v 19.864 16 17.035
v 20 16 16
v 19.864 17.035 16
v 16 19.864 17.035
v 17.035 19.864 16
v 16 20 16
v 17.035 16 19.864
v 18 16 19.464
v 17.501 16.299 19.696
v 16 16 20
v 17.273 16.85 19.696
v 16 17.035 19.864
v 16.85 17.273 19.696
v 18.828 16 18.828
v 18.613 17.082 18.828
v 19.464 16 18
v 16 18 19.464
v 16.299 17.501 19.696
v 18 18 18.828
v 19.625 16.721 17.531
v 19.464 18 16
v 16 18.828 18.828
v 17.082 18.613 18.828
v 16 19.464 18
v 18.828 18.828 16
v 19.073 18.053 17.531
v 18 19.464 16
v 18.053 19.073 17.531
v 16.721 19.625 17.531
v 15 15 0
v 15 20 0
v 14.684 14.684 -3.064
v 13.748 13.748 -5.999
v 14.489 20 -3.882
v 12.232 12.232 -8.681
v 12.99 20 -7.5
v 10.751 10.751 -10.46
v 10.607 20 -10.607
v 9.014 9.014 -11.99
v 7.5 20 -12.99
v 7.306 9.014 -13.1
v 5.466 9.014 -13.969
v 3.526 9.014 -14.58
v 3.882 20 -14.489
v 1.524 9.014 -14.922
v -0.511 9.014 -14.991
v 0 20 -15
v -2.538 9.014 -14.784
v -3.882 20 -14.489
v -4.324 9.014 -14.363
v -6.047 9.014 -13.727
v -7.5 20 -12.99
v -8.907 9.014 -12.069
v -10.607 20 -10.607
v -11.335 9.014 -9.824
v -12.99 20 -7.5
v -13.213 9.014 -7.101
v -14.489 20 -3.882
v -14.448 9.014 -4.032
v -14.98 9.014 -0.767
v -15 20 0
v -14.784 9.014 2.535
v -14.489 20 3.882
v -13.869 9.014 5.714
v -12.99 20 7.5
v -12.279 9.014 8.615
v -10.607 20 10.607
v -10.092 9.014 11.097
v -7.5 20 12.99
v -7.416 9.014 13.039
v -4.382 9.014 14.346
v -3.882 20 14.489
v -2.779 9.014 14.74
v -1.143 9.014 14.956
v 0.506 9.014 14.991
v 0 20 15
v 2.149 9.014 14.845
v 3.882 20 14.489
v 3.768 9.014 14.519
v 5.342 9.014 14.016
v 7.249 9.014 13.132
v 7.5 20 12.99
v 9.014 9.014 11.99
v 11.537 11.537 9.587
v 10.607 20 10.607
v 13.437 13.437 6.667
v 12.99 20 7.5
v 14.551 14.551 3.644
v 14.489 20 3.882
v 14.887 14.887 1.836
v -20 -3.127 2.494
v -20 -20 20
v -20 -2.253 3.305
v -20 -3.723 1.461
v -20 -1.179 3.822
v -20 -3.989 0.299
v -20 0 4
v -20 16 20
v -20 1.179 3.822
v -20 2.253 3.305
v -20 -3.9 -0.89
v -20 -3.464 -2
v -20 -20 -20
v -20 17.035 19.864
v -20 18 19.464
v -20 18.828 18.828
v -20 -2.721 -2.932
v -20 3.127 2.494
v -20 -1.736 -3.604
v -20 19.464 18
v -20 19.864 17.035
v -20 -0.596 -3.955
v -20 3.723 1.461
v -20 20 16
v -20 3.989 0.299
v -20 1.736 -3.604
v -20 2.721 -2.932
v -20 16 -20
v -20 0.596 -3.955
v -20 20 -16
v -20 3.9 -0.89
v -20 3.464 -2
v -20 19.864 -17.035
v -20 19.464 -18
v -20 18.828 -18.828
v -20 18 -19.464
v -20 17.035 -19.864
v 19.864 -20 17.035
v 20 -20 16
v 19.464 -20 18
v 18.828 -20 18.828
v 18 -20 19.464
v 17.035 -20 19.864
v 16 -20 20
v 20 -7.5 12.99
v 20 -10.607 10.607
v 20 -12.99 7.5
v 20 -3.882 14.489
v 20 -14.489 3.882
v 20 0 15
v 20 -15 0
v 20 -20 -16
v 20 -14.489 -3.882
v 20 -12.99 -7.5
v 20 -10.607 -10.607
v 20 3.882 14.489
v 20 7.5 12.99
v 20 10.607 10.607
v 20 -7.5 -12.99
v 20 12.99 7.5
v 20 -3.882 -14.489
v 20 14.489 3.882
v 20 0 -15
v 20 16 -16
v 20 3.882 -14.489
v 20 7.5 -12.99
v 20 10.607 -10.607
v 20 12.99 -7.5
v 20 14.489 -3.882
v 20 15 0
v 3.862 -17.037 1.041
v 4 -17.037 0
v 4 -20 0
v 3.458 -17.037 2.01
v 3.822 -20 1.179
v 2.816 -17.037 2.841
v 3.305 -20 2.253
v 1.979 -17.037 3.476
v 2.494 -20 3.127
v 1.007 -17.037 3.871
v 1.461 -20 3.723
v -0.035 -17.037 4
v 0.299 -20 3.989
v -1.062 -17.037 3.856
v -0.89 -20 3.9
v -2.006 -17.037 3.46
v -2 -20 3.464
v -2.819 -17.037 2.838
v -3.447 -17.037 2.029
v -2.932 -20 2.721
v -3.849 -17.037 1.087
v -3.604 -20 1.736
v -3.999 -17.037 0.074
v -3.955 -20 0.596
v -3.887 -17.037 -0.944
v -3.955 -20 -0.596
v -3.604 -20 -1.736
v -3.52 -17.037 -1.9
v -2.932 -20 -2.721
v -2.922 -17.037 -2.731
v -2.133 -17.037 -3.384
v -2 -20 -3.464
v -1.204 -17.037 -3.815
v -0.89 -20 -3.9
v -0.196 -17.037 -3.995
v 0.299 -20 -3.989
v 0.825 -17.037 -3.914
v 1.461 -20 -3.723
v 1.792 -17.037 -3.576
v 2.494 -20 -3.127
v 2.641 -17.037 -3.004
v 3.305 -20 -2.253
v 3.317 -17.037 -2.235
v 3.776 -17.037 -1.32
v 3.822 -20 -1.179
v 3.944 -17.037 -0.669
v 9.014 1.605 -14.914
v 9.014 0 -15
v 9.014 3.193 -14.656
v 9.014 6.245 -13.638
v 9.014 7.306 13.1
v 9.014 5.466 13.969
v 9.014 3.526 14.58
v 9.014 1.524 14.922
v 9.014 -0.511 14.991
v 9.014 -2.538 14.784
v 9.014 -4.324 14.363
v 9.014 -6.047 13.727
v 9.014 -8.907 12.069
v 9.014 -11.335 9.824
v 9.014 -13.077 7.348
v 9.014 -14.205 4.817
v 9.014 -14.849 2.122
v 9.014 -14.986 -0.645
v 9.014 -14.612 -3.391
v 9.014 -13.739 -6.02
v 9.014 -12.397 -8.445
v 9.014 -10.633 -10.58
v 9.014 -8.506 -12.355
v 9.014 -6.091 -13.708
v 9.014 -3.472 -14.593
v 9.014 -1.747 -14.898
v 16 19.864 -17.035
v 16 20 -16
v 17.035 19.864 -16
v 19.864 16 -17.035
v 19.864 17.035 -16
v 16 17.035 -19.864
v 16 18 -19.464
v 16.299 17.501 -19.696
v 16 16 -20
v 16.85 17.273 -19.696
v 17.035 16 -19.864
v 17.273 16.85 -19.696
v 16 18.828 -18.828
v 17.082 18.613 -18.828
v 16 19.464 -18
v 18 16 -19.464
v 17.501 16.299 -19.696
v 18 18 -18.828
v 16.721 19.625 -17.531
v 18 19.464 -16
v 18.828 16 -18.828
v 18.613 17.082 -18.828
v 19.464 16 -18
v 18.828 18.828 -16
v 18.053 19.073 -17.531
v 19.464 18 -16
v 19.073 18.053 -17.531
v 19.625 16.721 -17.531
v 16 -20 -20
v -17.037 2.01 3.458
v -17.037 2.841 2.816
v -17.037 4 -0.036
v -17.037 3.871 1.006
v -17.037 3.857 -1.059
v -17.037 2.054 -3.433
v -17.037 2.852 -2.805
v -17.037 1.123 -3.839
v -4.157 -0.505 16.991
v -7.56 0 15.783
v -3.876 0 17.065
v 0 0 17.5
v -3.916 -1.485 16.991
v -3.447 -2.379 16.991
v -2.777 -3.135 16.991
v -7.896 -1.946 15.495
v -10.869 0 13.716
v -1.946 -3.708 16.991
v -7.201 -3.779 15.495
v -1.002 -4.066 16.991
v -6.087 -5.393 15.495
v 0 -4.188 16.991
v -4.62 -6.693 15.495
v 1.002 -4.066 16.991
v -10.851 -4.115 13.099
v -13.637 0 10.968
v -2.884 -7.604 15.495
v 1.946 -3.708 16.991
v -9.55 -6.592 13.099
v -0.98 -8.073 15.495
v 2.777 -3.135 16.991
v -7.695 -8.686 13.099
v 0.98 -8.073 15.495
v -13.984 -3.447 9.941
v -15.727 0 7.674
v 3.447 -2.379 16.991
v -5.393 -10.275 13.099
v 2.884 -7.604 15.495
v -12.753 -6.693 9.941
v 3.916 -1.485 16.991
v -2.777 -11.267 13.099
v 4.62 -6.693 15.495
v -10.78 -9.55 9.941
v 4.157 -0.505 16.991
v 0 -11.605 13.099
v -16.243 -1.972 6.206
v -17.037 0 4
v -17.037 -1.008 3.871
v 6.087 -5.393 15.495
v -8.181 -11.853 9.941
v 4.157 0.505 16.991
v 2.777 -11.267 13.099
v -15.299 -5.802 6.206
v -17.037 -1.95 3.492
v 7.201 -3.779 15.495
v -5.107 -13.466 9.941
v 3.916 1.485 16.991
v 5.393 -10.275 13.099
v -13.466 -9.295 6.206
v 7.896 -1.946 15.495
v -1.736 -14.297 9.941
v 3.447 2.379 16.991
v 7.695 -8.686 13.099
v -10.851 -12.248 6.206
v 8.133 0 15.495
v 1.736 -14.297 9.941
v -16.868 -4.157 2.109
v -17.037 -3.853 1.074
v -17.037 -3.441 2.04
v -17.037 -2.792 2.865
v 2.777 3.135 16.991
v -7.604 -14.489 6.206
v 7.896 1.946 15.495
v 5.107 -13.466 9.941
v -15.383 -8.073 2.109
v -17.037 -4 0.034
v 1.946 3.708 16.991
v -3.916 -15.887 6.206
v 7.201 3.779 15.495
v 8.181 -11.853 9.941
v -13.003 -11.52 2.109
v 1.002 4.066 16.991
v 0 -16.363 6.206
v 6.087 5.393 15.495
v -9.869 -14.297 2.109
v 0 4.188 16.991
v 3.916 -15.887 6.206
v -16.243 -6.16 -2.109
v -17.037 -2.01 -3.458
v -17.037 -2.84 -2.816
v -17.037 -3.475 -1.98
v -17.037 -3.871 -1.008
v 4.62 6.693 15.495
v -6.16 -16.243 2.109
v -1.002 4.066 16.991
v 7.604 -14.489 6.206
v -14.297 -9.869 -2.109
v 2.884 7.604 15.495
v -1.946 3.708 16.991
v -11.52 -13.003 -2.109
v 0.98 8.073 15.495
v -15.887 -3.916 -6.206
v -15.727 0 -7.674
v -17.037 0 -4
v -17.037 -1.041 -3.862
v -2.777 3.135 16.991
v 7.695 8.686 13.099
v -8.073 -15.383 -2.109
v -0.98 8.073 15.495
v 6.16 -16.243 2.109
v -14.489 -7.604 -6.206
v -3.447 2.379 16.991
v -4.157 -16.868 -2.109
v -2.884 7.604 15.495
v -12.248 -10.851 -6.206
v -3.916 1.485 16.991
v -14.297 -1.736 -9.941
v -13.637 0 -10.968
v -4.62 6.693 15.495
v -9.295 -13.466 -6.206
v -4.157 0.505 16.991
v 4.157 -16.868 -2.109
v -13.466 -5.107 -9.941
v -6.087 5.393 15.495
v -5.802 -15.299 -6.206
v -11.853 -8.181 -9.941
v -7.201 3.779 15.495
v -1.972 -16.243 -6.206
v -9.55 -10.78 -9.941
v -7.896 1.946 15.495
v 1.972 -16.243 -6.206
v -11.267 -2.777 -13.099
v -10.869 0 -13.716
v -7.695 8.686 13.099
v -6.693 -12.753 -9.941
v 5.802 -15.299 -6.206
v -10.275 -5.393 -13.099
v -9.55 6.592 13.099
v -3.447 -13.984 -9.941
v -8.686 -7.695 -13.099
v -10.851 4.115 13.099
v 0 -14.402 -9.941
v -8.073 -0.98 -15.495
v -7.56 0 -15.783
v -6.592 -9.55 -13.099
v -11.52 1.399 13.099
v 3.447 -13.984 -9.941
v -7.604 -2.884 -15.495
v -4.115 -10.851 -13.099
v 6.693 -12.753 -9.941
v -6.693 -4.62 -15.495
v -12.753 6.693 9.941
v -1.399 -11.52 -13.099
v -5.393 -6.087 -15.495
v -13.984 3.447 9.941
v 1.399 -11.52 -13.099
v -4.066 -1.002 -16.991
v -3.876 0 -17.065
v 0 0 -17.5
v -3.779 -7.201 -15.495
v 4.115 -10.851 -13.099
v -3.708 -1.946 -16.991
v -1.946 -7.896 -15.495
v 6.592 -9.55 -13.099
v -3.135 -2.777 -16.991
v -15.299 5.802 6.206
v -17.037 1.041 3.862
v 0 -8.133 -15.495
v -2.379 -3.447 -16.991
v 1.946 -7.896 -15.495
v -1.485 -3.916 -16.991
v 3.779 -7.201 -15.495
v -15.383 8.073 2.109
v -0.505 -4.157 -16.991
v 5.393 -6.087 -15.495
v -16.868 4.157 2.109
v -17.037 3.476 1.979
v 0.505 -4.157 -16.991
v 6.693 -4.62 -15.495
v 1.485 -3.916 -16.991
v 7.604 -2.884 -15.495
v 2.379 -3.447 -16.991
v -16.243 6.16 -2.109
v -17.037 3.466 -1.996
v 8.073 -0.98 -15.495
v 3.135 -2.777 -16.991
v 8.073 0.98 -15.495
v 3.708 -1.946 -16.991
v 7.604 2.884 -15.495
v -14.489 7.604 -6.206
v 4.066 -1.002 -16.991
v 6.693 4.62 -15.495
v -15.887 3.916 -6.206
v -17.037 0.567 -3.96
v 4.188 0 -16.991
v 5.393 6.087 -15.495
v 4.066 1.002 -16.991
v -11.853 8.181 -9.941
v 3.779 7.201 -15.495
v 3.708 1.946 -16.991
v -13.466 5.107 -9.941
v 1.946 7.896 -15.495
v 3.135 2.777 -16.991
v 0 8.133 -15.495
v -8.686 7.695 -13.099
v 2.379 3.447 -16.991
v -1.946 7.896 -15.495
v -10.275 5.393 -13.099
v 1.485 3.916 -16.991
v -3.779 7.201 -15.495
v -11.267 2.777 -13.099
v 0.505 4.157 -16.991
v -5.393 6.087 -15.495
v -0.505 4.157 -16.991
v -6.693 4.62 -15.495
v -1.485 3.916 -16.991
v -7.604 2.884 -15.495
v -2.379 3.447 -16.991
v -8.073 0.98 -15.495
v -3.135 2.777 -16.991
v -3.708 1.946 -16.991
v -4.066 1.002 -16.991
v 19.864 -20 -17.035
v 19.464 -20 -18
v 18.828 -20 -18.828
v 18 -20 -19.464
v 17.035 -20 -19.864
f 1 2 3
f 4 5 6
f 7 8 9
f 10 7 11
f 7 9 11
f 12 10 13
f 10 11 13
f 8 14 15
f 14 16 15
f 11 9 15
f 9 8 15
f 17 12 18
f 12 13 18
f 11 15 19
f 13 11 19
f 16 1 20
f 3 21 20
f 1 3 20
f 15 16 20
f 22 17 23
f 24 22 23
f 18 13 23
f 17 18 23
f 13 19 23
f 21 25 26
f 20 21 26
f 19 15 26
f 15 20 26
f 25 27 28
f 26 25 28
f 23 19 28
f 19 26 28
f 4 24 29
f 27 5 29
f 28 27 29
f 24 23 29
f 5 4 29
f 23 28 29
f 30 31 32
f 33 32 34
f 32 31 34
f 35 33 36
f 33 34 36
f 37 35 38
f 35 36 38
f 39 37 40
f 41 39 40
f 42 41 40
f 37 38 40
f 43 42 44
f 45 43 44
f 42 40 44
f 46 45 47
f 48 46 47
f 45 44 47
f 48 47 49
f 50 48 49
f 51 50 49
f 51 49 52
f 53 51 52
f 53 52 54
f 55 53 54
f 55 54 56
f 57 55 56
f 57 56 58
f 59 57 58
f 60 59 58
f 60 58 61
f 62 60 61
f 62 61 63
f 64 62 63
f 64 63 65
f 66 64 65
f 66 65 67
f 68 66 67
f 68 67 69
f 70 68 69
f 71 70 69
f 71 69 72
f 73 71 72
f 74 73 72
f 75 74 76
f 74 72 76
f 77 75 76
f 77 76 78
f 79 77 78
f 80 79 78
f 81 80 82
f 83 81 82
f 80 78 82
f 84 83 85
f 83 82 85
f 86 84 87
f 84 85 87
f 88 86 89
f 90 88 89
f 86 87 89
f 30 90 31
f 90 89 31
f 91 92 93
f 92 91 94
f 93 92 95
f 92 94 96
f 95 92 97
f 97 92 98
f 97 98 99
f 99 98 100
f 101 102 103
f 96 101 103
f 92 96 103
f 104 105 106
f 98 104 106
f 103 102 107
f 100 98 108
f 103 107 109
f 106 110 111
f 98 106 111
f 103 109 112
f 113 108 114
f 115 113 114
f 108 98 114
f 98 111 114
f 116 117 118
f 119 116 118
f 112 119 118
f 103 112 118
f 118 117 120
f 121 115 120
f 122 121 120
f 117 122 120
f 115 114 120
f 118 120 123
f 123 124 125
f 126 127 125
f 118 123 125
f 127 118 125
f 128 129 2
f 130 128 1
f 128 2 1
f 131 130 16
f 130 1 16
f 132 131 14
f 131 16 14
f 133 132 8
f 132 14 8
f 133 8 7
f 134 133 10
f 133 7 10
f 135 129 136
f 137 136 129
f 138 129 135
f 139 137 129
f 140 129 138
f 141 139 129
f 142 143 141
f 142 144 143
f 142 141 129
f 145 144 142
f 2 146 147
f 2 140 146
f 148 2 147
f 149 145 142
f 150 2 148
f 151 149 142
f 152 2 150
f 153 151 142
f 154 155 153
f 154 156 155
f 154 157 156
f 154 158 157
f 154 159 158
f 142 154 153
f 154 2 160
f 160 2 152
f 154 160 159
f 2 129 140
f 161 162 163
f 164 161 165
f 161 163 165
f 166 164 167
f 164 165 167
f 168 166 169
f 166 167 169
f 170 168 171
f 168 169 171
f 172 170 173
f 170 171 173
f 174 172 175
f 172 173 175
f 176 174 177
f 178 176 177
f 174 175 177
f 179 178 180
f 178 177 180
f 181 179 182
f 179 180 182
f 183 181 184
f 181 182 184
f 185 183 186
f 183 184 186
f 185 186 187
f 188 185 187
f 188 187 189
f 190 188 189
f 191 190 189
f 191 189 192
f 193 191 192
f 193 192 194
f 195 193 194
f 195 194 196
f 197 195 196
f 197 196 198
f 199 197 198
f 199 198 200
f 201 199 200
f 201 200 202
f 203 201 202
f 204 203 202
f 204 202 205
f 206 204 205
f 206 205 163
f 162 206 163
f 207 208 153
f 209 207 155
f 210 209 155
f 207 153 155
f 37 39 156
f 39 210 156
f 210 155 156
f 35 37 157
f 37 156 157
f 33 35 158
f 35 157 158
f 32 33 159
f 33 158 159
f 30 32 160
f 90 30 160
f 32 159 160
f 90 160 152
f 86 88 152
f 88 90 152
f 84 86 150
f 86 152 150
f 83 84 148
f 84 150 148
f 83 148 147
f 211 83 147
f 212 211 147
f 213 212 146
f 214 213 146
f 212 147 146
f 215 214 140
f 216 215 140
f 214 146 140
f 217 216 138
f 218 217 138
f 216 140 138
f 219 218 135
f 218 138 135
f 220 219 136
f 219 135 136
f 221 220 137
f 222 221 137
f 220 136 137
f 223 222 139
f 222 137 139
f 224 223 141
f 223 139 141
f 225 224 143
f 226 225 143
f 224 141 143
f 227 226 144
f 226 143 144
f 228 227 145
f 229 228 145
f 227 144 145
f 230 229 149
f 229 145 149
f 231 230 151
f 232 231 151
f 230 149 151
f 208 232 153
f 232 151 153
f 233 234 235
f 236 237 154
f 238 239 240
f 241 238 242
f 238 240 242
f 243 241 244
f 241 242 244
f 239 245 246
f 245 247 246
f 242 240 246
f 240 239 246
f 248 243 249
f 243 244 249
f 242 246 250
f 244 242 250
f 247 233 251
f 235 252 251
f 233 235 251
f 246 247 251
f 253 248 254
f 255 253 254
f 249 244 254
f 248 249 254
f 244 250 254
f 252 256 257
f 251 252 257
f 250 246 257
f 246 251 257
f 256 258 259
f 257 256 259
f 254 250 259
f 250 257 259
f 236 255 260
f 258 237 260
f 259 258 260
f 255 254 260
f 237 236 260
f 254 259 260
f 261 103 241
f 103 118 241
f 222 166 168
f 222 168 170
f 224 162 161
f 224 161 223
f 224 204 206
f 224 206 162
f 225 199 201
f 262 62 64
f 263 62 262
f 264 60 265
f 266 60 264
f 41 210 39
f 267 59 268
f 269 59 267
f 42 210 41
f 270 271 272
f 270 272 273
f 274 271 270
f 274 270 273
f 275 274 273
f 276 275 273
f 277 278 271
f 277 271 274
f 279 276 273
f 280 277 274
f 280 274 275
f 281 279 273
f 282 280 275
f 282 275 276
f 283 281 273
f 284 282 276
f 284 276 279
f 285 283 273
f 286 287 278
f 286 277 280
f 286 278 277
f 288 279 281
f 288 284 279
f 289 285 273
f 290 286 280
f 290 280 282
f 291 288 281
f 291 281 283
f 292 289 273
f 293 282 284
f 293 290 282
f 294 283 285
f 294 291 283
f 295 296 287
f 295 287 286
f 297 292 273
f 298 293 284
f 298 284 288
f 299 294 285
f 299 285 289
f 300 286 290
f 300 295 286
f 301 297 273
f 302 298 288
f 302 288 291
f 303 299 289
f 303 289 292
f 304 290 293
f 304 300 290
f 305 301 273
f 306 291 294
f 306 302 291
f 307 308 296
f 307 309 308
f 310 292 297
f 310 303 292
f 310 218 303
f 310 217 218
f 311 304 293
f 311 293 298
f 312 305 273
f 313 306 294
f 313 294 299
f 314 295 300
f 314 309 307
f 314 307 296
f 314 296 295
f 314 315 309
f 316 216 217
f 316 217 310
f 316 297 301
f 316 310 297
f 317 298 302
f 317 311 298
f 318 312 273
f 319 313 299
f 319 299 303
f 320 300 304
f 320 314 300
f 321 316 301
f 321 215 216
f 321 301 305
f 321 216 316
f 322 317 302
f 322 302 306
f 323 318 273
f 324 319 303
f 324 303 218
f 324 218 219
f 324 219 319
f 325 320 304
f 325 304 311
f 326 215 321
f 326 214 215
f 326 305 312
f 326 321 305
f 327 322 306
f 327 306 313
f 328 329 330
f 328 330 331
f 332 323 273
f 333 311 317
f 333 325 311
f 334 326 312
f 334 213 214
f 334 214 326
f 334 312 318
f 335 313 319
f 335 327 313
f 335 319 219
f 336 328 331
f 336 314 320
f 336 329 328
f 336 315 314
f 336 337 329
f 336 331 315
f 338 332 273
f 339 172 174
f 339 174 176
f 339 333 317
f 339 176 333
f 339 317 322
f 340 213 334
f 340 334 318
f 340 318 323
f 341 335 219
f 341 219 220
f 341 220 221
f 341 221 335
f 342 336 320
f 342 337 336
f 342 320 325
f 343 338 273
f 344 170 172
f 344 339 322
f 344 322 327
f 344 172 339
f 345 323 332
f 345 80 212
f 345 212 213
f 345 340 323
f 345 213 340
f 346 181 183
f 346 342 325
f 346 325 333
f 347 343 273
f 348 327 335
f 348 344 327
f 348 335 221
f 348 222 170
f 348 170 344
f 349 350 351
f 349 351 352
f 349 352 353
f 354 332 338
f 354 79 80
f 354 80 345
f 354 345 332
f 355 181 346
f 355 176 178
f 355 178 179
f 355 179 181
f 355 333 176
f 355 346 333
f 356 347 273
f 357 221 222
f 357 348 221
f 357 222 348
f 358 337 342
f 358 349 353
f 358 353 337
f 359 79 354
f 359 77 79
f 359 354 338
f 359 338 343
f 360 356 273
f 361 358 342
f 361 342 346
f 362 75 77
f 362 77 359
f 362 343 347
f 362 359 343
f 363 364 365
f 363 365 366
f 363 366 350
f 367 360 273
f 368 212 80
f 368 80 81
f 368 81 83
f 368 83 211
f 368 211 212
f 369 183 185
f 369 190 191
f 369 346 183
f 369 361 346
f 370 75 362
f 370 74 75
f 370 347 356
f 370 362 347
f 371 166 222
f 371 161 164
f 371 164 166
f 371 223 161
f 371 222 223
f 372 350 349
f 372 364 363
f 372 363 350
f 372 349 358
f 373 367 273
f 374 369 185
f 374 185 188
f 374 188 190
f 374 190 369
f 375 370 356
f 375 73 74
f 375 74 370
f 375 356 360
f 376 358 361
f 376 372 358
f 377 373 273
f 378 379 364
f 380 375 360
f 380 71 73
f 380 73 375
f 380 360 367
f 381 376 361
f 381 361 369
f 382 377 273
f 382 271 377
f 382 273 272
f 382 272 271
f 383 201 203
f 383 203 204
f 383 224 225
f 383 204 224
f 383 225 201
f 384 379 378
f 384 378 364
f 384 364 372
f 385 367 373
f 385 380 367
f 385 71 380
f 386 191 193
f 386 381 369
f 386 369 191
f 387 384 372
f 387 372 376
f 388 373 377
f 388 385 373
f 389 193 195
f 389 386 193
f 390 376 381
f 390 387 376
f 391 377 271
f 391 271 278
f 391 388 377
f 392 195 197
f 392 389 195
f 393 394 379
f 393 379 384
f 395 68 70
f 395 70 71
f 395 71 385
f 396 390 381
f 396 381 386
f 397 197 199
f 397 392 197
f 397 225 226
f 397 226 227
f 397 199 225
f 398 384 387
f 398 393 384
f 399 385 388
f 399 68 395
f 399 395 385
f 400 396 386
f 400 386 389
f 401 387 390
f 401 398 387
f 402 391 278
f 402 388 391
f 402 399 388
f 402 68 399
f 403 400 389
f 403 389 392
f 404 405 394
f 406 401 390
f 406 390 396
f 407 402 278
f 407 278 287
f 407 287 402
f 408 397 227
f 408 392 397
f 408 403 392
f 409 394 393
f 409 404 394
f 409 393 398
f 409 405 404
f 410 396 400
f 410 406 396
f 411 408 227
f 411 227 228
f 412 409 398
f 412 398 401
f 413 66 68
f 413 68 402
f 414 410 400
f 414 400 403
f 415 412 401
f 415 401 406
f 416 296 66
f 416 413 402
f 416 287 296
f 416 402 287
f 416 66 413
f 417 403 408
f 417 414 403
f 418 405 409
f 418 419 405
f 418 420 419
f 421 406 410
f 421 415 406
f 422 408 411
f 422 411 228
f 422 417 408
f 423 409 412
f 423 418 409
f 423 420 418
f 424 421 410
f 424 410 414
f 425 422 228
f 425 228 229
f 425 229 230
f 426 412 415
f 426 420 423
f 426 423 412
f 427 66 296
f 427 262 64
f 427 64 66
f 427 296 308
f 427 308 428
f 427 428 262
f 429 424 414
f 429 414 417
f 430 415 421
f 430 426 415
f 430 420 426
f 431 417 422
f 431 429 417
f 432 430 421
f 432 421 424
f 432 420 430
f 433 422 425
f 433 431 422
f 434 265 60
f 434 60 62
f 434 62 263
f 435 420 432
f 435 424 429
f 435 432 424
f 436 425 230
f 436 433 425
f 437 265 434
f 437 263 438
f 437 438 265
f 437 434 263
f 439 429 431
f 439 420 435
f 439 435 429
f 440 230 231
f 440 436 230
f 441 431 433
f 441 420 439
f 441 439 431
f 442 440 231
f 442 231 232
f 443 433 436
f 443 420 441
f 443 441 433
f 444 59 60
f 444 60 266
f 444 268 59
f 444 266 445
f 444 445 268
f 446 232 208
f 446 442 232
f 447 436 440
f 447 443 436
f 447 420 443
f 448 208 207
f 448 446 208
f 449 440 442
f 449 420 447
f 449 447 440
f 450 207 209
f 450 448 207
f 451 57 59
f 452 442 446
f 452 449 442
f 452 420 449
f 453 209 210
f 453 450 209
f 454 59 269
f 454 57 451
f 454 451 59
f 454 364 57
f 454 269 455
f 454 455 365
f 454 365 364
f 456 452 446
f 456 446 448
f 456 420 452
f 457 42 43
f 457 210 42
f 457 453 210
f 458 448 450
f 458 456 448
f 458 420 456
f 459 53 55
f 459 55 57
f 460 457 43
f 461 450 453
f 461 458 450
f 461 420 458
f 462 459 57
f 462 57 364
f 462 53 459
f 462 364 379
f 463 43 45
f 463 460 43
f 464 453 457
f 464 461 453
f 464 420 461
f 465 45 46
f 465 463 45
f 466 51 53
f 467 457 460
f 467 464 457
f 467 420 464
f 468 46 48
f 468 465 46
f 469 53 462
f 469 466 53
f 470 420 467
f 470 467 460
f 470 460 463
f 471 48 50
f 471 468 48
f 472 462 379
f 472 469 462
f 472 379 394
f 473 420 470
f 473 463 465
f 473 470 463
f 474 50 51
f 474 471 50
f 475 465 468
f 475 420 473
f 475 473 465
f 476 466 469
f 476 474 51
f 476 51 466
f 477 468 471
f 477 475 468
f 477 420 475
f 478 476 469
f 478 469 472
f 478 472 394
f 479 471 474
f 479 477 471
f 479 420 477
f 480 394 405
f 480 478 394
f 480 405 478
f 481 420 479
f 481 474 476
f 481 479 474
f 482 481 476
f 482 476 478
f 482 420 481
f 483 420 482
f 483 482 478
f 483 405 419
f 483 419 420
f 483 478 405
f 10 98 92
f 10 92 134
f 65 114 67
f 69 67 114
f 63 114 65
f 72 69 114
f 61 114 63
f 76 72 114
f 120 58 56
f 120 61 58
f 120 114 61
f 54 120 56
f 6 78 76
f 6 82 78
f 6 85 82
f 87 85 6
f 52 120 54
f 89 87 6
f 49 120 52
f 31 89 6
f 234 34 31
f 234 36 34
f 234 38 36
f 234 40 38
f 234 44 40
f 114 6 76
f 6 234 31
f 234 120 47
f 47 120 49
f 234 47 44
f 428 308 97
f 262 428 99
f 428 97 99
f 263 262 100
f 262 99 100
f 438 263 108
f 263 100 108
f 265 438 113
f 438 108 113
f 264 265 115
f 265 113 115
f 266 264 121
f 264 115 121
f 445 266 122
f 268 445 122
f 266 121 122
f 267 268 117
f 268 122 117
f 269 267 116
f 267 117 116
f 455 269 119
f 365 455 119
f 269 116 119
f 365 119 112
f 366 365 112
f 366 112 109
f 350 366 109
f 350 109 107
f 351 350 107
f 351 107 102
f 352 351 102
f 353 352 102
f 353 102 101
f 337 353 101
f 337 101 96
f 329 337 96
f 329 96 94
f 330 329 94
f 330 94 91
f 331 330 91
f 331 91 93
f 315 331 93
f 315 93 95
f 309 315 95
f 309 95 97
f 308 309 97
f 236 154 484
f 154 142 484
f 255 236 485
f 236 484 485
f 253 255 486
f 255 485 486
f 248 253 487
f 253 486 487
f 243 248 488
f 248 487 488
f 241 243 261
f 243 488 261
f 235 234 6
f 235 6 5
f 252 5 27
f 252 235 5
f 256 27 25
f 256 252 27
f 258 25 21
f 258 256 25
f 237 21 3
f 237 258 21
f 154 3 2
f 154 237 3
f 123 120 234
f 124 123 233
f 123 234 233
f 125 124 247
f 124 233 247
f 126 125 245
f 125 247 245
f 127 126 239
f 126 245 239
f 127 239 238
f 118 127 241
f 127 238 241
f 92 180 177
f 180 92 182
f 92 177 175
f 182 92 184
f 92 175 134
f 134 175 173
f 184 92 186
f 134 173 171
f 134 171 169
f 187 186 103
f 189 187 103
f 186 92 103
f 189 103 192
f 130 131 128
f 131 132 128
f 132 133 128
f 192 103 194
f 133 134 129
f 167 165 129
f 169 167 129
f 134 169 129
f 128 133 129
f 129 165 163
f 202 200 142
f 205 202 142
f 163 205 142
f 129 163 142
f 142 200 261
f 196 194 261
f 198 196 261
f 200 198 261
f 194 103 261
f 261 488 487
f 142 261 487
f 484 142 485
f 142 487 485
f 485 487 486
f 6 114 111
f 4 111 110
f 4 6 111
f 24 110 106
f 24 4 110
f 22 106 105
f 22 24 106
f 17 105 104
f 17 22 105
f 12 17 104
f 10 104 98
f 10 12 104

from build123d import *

# Parameters (mm, degrees)
SKETCH1_W           = 40
SKETCH1_H           = 40
BOSS_EXTRUDE1_DEPTH = 20
FILLET1_R           = 4
SKETCH12_R          = 15
CUT_EXTRUDE2_DEPTH  = 20
SKETCH13_R          = 15
CUT_EXTRUDE3_DEPTH  = 20
SKETCH16_R          = 4
CUT_EXTRUDE6_DEPTH  = 20
SKETCH17_R          = 4
CUT_EXTRUDE7_DEPTH  = 20


with BuildPart() as part:
    # Sketch1 → Boss-Extrude1 (new body, symmetric)
    with BuildSketch(Plane(origin=(0, 0, 0), x_dir=(1, 0, 0), z_dir=(0, 1, 0))):
        Rectangle(SKETCH1_W, SKETCH1_H)
    extrude(amount=BOSS_EXTRUDE1_DEPTH, both=True)

    # Fillet1
    fillet1_edges = [part.edges().sort_by_distance(p)[0] for p in [
        (20, 20, 0),
        (0, 20, -20),
        (20, 0, -20),
        (20, 0, 20),
        (0, 20, 20),
    ]]
    fillet(fillet1_edges, radius=FILLET1_R)

    # Sketch2 → Cut-Revolve1 (revolve, cut)
    with BuildSketch(Plane(origin=(0, 0, 0), x_dir=(1, 0, 0), z_dir=(0, 1, 0))):
        with BuildLine():
            Line((0, 17.5), (0, -17.5))
            ThreePointArc((0, -17.5), (-17.5, 0), (0, 17.5))
        make_face()
    revolve(axis=Axis((0, 0, -20.989422068), (0, 0, 1)), mode=Mode.SUBTRACT)

    # Sketch12 → Cut-Extrude2 (cut)
    with BuildSketch(Plane(origin=(0, 20, 0), x_dir=(1, 0, 0), z_dir=(0, 1, 0))):
        Circle(SKETCH12_R)
    extrude(amount=-CUT_EXTRUDE2_DEPTH, mode=Mode.SUBTRACT)

    # Sketch13 → Cut-Extrude3 (cut)
    with BuildSketch(Plane(origin=(20, 0, 0), x_dir=(0, 0, -1), z_dir=(1, 0, 0))):
        Circle(SKETCH13_R)
    extrude(amount=-CUT_EXTRUDE3_DEPTH, mode=Mode.SUBTRACT)

    # Sketch16 → Cut-Extrude6 (cut)
    with BuildSketch(Plane.XZ.offset(20)):
        Circle(SKETCH16_R)
    extrude(amount=-CUT_EXTRUDE6_DEPTH, mode=Mode.SUBTRACT)

    # Sketch17 → Cut-Extrude7 (cut)
    with BuildSketch(Plane.ZY.offset(20)):
        Circle(SKETCH17_R)
    extrude(amount=-CUT_EXTRUDE7_DEPTH, mode=Mode.SUBTRACT)


solid = part.part
